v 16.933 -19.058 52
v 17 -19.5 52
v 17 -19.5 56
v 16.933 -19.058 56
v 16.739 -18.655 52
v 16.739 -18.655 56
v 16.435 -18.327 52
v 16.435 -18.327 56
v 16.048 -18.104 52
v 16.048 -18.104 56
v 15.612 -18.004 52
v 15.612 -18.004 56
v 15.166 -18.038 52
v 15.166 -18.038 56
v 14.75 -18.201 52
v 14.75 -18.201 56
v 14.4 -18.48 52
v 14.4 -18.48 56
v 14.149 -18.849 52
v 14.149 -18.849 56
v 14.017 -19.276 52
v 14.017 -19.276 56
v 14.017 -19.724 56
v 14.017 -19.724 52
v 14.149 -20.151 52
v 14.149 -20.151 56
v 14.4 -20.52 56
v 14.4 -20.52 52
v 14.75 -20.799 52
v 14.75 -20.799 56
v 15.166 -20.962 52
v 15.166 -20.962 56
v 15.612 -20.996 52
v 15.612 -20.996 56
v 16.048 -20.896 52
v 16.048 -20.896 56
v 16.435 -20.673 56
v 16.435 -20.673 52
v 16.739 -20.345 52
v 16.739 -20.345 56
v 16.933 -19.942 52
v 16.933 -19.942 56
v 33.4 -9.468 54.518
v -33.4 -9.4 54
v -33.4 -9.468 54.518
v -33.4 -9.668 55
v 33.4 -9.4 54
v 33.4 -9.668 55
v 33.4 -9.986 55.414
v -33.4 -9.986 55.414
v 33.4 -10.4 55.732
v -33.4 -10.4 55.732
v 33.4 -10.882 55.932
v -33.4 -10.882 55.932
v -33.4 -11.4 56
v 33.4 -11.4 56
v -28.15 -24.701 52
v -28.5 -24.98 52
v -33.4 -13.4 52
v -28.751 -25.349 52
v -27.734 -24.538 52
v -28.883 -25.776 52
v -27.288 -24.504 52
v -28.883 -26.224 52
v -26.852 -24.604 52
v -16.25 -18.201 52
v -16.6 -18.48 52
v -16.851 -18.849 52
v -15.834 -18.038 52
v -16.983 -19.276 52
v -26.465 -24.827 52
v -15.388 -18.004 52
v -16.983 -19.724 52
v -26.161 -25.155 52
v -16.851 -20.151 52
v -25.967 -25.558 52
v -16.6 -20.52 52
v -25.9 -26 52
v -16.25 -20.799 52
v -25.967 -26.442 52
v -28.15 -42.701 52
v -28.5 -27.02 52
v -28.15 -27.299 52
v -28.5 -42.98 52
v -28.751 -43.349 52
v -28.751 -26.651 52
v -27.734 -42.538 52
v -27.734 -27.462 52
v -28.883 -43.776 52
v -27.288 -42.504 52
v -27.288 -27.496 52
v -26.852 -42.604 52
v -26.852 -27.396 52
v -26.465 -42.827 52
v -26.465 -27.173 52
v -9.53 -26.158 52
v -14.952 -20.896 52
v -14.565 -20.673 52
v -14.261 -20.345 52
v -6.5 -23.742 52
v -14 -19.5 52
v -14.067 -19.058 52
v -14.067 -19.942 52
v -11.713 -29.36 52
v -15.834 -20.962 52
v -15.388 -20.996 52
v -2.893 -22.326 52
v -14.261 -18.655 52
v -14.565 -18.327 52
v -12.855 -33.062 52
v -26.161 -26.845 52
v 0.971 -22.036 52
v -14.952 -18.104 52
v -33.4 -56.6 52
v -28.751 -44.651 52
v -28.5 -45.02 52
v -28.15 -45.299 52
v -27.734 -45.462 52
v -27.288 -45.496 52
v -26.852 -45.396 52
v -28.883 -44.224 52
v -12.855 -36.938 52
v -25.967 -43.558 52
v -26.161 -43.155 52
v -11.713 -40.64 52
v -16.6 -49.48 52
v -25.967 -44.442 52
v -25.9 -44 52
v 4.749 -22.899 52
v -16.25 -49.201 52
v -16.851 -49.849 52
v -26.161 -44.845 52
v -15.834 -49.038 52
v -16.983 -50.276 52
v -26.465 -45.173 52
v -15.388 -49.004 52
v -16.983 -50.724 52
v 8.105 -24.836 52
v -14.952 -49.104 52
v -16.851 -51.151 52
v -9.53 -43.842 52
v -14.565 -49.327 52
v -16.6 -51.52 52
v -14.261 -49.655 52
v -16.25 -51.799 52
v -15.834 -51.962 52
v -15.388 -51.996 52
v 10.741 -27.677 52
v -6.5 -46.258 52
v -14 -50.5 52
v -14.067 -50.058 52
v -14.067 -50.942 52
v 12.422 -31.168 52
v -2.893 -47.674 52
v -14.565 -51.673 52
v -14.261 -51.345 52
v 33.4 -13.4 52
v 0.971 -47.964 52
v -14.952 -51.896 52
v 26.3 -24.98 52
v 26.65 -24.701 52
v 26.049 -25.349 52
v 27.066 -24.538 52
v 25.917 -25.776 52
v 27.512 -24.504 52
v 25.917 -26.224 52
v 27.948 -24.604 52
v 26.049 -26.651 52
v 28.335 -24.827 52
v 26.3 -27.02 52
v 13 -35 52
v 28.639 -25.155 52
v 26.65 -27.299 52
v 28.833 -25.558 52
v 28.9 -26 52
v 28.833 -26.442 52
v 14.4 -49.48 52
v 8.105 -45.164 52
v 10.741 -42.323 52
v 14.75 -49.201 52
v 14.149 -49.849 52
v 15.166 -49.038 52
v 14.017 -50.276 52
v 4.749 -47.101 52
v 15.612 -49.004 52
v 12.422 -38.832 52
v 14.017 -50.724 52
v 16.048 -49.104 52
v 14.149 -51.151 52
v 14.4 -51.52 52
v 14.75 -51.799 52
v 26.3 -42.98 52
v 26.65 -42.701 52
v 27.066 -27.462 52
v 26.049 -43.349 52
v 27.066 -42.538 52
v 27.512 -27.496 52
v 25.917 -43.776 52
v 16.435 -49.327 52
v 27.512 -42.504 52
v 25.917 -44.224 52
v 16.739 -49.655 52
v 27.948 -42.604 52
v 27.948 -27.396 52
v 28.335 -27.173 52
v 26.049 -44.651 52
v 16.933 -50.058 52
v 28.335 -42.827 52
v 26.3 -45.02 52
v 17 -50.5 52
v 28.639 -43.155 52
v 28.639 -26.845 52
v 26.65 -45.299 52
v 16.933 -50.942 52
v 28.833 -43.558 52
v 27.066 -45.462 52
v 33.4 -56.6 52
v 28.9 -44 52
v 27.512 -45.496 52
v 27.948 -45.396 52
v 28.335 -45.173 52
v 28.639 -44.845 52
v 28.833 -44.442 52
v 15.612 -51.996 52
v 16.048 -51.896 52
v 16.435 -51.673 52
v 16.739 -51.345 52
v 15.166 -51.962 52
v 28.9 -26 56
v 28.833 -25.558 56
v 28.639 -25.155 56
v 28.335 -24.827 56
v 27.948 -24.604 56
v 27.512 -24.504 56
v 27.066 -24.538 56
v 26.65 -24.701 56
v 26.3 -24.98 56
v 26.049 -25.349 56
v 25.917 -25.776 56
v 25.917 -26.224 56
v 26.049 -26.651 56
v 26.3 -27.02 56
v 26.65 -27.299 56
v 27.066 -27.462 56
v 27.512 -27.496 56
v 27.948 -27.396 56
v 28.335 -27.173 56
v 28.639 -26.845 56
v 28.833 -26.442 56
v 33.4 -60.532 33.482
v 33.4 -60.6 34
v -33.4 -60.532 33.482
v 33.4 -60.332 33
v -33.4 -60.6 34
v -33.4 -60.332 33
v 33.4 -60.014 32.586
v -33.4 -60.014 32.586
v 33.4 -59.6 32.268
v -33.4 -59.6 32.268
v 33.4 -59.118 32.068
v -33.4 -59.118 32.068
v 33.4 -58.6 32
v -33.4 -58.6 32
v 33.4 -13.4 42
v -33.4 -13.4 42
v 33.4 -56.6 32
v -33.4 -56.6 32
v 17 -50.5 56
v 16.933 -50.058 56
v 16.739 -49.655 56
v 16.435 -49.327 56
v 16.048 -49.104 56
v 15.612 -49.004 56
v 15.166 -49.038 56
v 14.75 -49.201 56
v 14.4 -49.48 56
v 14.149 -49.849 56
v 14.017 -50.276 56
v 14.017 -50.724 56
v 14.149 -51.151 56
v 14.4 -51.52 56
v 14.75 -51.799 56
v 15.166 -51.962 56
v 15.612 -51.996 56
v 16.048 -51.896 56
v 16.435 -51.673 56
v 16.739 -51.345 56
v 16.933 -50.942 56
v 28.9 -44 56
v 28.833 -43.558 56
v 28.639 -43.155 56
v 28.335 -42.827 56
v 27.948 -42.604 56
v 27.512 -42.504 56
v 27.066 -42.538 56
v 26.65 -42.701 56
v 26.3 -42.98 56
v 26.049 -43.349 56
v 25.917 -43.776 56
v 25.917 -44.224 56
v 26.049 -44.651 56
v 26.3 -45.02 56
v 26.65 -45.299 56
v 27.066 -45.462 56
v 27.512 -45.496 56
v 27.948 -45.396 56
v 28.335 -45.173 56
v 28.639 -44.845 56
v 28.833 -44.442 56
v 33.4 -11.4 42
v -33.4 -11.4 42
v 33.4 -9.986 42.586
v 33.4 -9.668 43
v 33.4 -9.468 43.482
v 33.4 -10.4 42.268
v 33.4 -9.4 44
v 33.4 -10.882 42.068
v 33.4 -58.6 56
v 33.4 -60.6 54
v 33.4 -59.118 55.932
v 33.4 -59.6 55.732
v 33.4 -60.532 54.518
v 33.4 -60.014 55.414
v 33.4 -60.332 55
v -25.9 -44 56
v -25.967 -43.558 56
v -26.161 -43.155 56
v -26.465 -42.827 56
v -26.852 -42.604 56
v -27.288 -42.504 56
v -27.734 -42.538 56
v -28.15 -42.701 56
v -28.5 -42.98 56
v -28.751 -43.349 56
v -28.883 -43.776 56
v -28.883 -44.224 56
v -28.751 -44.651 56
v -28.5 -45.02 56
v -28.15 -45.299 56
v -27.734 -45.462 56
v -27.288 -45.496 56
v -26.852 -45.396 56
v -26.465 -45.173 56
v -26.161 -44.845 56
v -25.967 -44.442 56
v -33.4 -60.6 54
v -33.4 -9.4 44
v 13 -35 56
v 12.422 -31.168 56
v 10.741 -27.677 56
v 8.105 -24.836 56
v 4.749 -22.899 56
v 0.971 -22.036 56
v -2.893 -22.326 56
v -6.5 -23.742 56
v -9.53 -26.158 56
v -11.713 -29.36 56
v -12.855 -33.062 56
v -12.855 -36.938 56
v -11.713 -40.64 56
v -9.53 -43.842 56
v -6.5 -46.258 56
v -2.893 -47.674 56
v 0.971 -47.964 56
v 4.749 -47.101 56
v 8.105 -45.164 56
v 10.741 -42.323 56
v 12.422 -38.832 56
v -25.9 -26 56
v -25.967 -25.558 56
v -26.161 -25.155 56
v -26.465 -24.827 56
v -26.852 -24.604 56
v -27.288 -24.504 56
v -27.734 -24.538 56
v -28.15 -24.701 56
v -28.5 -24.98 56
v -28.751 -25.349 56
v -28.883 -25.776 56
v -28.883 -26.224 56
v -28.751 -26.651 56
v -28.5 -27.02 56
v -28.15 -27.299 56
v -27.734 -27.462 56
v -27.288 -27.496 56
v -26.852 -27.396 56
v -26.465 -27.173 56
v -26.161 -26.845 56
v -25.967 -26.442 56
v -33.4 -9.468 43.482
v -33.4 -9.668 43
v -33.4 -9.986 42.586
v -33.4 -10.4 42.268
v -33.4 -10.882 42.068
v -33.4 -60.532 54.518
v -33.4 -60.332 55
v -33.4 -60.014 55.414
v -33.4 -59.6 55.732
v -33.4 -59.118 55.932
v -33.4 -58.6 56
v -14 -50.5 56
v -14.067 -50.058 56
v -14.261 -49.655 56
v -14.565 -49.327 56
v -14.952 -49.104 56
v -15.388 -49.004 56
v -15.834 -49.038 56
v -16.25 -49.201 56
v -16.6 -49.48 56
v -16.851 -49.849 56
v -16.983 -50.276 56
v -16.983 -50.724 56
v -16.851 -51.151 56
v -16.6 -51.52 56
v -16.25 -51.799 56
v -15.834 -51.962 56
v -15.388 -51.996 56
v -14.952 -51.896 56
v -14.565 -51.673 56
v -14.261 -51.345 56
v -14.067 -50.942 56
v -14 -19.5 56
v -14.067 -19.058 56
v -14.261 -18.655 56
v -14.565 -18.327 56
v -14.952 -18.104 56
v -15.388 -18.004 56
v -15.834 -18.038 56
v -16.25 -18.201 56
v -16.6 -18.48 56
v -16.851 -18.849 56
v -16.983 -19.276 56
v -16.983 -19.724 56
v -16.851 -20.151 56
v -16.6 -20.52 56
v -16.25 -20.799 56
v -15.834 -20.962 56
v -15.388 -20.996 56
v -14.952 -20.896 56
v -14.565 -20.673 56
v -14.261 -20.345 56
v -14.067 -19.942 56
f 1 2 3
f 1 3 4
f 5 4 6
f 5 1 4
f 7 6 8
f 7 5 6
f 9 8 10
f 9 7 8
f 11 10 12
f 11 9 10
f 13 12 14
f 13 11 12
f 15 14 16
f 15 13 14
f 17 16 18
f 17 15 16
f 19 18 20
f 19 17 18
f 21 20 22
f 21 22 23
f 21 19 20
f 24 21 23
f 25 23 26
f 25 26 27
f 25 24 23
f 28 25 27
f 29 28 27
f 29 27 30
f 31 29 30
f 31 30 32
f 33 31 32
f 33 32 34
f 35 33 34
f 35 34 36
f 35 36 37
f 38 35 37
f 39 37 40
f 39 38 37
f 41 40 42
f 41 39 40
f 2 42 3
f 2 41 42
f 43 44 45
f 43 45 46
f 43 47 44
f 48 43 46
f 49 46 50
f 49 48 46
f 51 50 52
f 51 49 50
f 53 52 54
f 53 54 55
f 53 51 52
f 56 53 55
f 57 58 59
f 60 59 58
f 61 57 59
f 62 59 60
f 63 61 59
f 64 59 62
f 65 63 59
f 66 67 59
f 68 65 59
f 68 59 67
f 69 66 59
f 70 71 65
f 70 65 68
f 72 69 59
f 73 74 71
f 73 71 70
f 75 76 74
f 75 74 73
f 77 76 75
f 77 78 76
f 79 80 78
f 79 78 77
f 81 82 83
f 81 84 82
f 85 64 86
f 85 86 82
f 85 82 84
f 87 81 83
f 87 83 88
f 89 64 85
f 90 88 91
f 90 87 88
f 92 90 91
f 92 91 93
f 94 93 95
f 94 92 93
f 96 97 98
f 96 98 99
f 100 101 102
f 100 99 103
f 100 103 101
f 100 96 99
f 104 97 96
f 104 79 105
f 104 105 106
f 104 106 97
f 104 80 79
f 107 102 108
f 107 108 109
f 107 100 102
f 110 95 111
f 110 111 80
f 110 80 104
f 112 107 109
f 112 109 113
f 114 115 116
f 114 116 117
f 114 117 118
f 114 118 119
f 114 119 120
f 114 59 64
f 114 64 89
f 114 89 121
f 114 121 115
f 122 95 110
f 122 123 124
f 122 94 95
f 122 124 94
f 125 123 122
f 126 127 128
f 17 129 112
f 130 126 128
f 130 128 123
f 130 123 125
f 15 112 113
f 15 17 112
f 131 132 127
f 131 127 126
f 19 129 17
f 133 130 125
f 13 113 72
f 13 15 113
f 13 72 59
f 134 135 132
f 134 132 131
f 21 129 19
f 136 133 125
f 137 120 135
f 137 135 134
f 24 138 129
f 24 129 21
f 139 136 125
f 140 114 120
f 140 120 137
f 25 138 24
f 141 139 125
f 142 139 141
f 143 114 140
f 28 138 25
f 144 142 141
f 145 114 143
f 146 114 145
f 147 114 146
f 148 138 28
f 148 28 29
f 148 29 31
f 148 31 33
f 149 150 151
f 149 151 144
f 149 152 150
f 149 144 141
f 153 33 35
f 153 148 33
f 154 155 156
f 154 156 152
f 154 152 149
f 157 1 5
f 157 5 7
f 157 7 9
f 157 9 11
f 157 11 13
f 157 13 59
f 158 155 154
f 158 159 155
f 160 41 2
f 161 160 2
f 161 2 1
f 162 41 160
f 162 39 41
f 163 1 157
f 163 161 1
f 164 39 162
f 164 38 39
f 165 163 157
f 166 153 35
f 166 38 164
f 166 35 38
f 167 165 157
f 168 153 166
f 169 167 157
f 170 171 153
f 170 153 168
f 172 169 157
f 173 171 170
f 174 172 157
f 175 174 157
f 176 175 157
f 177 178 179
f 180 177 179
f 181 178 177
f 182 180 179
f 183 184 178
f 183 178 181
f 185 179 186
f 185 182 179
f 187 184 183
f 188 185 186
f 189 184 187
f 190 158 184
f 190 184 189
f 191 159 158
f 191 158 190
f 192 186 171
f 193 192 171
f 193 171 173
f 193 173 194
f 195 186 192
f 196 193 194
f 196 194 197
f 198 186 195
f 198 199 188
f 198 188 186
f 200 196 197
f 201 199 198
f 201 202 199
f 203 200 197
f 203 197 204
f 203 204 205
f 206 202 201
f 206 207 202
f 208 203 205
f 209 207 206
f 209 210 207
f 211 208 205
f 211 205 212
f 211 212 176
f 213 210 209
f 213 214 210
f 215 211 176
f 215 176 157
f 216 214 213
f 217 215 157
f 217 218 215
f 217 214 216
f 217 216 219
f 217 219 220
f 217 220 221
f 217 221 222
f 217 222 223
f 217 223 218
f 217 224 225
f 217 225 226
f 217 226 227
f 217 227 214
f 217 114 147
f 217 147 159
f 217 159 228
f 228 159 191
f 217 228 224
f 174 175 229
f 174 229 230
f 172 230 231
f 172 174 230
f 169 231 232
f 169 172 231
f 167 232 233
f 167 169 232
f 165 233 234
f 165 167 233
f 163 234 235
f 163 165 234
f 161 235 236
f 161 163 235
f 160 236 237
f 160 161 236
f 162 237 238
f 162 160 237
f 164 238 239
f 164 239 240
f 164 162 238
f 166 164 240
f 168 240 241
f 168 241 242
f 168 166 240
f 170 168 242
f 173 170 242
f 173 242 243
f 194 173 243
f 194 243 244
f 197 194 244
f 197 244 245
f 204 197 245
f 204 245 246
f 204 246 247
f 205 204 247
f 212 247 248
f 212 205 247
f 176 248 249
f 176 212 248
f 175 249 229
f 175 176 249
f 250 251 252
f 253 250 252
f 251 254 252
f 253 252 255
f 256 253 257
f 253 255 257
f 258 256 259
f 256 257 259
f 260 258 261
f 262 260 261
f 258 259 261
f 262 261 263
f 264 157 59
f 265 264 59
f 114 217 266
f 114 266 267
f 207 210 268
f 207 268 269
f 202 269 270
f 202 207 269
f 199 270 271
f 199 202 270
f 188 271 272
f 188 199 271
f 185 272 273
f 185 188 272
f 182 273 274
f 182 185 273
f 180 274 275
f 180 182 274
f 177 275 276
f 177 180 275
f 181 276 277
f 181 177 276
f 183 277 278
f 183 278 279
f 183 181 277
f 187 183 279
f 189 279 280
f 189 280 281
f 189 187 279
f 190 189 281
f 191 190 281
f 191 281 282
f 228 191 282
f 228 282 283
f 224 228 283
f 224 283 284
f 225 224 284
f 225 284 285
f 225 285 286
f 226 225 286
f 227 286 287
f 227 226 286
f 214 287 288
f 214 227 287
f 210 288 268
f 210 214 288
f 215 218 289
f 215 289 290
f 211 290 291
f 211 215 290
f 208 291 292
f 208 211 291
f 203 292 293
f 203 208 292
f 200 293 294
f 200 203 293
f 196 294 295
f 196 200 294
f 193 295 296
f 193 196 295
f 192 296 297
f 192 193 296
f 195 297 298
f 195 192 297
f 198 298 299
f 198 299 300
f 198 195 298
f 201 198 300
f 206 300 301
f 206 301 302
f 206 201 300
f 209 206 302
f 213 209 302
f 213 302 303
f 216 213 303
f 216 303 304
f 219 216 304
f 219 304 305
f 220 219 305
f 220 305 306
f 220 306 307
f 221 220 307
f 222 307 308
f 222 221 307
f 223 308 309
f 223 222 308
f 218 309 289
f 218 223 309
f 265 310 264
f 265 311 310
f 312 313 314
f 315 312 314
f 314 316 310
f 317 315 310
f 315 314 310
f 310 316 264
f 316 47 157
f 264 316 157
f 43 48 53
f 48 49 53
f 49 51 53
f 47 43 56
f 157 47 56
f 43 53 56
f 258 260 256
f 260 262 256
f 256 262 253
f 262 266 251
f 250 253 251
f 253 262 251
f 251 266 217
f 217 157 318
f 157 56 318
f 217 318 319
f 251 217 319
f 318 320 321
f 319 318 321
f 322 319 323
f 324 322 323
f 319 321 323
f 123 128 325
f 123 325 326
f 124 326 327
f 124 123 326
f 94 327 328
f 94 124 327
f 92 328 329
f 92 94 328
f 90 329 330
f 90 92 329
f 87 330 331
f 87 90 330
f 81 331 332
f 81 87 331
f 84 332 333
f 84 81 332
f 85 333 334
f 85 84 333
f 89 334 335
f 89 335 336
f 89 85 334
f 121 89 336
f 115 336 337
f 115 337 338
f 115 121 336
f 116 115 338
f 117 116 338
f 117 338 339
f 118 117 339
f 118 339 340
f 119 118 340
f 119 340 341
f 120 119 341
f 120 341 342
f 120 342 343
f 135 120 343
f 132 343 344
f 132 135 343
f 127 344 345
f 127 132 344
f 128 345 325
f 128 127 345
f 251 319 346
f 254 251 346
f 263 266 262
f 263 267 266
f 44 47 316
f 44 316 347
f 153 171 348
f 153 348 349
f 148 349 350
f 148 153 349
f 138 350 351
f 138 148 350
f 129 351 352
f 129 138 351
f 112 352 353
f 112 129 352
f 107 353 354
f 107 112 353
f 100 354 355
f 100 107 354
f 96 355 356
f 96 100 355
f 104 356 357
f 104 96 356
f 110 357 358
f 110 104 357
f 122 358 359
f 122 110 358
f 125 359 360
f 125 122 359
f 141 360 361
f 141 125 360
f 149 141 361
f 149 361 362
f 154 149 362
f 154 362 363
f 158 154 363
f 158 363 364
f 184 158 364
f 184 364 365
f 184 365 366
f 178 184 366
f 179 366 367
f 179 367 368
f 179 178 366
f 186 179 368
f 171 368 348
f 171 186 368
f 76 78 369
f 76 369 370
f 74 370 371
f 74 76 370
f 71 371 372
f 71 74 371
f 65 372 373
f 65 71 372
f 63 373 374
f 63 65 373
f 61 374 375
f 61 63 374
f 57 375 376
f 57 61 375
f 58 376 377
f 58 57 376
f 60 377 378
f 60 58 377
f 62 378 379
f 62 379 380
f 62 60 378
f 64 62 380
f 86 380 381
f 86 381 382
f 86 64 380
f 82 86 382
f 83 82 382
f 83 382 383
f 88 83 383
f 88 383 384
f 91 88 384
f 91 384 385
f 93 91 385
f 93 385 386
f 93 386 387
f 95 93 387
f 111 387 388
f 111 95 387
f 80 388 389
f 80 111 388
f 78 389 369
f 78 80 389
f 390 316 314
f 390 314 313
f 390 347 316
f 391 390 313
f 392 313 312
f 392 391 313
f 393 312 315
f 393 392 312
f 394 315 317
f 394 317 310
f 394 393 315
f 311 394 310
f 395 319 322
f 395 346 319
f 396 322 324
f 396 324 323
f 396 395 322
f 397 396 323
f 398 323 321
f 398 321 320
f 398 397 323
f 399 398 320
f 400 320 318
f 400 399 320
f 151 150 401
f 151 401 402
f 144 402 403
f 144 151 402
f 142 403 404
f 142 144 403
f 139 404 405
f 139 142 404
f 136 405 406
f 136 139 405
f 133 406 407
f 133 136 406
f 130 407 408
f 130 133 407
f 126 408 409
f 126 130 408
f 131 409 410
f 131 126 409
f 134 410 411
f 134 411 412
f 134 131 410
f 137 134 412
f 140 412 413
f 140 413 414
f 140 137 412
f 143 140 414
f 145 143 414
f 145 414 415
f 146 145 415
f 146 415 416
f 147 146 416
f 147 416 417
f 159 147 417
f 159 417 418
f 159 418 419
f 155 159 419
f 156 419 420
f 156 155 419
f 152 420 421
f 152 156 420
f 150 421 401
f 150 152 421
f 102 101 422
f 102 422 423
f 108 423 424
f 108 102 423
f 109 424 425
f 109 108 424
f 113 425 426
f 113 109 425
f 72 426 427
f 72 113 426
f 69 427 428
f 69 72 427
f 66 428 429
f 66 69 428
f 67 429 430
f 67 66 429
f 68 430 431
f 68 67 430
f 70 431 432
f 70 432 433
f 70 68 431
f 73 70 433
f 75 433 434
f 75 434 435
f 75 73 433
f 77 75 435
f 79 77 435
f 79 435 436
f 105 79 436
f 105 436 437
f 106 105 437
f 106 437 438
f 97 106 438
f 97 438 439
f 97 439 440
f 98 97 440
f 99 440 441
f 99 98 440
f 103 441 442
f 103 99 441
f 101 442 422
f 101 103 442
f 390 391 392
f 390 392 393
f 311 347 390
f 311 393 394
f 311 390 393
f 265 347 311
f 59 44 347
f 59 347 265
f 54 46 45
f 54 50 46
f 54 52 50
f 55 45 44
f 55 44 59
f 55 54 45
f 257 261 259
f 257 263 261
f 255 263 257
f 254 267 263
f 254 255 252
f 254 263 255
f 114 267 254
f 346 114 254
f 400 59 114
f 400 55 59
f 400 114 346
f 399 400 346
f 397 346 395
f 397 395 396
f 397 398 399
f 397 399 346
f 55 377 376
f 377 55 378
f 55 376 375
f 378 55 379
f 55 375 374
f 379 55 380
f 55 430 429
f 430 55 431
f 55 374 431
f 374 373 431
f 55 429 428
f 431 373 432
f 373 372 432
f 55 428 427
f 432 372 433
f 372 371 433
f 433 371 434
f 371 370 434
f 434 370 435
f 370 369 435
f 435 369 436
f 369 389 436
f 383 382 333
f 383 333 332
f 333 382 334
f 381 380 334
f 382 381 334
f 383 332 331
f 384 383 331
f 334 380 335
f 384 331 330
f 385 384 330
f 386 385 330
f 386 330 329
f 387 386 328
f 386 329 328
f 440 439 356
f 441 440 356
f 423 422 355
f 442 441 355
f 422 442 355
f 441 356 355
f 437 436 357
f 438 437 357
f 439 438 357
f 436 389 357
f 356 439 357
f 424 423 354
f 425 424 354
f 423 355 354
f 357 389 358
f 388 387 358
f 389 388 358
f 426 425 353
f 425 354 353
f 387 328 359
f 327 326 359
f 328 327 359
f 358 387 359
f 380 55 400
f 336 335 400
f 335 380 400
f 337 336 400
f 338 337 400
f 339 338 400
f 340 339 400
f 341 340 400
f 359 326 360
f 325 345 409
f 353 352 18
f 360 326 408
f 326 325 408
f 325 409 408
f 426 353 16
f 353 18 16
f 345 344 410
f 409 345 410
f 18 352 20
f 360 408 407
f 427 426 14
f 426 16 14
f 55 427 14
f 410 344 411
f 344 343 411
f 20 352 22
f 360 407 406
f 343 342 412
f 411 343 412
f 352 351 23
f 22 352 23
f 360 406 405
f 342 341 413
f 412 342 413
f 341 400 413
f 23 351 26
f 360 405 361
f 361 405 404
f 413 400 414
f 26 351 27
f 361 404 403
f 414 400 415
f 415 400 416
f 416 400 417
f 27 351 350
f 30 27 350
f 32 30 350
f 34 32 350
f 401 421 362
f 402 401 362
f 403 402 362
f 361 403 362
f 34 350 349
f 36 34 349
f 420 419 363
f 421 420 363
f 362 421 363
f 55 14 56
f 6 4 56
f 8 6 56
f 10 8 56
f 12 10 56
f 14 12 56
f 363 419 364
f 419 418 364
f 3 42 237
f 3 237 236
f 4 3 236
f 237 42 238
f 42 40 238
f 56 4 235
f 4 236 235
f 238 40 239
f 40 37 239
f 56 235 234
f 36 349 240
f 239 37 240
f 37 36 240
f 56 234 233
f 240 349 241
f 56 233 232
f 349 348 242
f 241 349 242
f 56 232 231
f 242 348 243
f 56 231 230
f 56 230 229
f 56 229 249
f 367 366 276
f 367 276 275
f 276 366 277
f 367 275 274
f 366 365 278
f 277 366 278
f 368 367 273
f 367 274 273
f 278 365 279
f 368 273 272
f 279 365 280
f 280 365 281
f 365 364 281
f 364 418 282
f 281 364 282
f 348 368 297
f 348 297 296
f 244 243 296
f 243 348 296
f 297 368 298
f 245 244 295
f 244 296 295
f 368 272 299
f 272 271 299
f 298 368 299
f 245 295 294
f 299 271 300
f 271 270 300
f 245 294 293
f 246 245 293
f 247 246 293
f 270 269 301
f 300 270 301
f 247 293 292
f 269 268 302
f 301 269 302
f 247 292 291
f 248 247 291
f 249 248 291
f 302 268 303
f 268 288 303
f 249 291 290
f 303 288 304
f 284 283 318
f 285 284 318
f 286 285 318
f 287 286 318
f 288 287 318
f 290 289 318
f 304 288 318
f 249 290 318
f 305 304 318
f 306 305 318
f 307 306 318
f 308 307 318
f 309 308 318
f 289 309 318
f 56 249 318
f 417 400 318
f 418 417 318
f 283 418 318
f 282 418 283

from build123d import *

# Parameters (mm, degrees)
SKETCH003_W     = 66.8
SKETCH003_H     = 42
SKETCH003_R     = 1.5
SKETCH003_R_2   = 13
PAD003_DEPTH    = 4
PAD003_FACE3_W  = 66.8
PAD003_FACE3_H  = 4
PAD004_DEPTH    = 0.6
PAD004_FACE19_W = 66.8
PAD004_FACE19_H = 4
PAD005_DEPTH    = 4
PAD005_FACE21_W = 4
PAD005_FACE21_H = 66.8
PAD006_DEPTH    = 20
PAD006_FACE1_W  = 66.8
PAD006_FACE1_H  = 4
PAD007_DEPTH    = 0.6
PAD007_FACE11_W = 66.8
PAD007_FACE11_H = 4
PAD008_DEPTH    = 4
PAD008_FACE28_W = 4
PAD008_FACE28_H = 66.8
PAD009_DEPTH    = 10
FILLET003_R     = 2


with BuildPart() as part:
    # Sketch003 → Pad003 (new body)
    with BuildSketch(Plane.XY):
        with Locations((0, -35)):
            Rectangle(SKETCH003_W, SKETCH003_H)
        with Locations((-27.4, -26)):
            Circle(SKETCH003_R, mode=Mode.SUBTRACT)
        with Locations((0, -35)):
            Circle(SKETCH003_R_2, mode=Mode.SUBTRACT)
        with Locations((27.4, -26)):
            Circle(SKETCH003_R, mode=Mode.SUBTRACT)
        with Locations((27.4, -44)):
            Circle(SKETCH003_R, mode=Mode.SUBTRACT)
        with Locations((-27.4, -44)):
            Circle(SKETCH003_R, mode=Mode.SUBTRACT)
        with Locations((-15.5, -50.5)):
            Circle(SKETCH003_R, mode=Mode.SUBTRACT)
        with Locations((15.5, -50.5)):
            Circle(SKETCH003_R, mode=Mode.SUBTRACT)
        with Locations((-15.5, -19.5)):
            Circle(SKETCH003_R, mode=Mode.SUBTRACT)
        with Locations((15.5, -19.5)):
            Circle(SKETCH003_R, mode=Mode.SUBTRACT)
    extrude(amount=PAD003_DEPTH)

    # Pad003 Face3 → Pad004 (add)
    with BuildSketch(Plane(origin=(0, -56, 2), x_dir=(-1, 0, 0), z_dir=(0, -1, 0))):
        Rectangle(PAD003_FACE3_W, PAD003_FACE3_H)
    extrude(amount=PAD004_DEPTH)

    # Pad004 Face19 → Pad005 (add)
    with BuildSketch(Plane(origin=(0, -56.6, 2), x_dir=(-1, 0, 0), z_dir=(0, -1, 0))):
        Rectangle(PAD004_FACE19_W, PAD004_FACE19_H)
    extrude(amount=PAD005_DEPTH)

    # Pad005 Face21 → Pad006 (add)
    with BuildSketch(Plane(origin=(0, -58.6, 0), x_dir=(0, -1, 0), z_dir=(0, 0, -1))):
        Rectangle(PAD005_FACE21_W, PAD005_FACE21_H)
    extrude(amount=PAD006_DEPTH)

    # Pad006 Face1 → Pad007 (add)
    with BuildSketch(Plane(origin=(0, -14, 2), x_dir=(1, 0, 0), z_dir=(0, 1, 0))):
        Rectangle(PAD006_FACE1_W, PAD006_FACE1_H)
    extrude(amount=PAD007_DEPTH)

    # Pad007 Face11 → Pad008 (add)
    with BuildSketch(Plane(origin=(0, -13.4, 2), x_dir=(1, 0, 0), z_dir=(0, 1, 0))):
        Rectangle(PAD007_FACE11_W, PAD007_FACE11_H)
    extrude(amount=PAD008_DEPTH)

    # Pad008 Face28 → Pad009 (add)
    with BuildSketch(Plane(origin=(0, -11.4, 0), x_dir=(0, -1, 0), z_dir=(0, 0, -1))):
        Rectangle(PAD008_FACE28_W, PAD008_FACE28_H)
    extrude(amount=PAD009_DEPTH)

    # Fillet003
    fillet003_edges = [part.edges().sort_by_distance(p)[0] for p in [
        (0, -60.6, -20),
        (0, -60.6, 4),
        (0, -9.4, 4),
        (0, -9.4, -10),
    ]]
    fillet(fillet003_edges, radius=FILLET003_R)


with BuildPart() as part_1:
    # Body001 placement: moved
    add(part.part.moved(Location((0, 0, 52))))


solid = part_1.part
